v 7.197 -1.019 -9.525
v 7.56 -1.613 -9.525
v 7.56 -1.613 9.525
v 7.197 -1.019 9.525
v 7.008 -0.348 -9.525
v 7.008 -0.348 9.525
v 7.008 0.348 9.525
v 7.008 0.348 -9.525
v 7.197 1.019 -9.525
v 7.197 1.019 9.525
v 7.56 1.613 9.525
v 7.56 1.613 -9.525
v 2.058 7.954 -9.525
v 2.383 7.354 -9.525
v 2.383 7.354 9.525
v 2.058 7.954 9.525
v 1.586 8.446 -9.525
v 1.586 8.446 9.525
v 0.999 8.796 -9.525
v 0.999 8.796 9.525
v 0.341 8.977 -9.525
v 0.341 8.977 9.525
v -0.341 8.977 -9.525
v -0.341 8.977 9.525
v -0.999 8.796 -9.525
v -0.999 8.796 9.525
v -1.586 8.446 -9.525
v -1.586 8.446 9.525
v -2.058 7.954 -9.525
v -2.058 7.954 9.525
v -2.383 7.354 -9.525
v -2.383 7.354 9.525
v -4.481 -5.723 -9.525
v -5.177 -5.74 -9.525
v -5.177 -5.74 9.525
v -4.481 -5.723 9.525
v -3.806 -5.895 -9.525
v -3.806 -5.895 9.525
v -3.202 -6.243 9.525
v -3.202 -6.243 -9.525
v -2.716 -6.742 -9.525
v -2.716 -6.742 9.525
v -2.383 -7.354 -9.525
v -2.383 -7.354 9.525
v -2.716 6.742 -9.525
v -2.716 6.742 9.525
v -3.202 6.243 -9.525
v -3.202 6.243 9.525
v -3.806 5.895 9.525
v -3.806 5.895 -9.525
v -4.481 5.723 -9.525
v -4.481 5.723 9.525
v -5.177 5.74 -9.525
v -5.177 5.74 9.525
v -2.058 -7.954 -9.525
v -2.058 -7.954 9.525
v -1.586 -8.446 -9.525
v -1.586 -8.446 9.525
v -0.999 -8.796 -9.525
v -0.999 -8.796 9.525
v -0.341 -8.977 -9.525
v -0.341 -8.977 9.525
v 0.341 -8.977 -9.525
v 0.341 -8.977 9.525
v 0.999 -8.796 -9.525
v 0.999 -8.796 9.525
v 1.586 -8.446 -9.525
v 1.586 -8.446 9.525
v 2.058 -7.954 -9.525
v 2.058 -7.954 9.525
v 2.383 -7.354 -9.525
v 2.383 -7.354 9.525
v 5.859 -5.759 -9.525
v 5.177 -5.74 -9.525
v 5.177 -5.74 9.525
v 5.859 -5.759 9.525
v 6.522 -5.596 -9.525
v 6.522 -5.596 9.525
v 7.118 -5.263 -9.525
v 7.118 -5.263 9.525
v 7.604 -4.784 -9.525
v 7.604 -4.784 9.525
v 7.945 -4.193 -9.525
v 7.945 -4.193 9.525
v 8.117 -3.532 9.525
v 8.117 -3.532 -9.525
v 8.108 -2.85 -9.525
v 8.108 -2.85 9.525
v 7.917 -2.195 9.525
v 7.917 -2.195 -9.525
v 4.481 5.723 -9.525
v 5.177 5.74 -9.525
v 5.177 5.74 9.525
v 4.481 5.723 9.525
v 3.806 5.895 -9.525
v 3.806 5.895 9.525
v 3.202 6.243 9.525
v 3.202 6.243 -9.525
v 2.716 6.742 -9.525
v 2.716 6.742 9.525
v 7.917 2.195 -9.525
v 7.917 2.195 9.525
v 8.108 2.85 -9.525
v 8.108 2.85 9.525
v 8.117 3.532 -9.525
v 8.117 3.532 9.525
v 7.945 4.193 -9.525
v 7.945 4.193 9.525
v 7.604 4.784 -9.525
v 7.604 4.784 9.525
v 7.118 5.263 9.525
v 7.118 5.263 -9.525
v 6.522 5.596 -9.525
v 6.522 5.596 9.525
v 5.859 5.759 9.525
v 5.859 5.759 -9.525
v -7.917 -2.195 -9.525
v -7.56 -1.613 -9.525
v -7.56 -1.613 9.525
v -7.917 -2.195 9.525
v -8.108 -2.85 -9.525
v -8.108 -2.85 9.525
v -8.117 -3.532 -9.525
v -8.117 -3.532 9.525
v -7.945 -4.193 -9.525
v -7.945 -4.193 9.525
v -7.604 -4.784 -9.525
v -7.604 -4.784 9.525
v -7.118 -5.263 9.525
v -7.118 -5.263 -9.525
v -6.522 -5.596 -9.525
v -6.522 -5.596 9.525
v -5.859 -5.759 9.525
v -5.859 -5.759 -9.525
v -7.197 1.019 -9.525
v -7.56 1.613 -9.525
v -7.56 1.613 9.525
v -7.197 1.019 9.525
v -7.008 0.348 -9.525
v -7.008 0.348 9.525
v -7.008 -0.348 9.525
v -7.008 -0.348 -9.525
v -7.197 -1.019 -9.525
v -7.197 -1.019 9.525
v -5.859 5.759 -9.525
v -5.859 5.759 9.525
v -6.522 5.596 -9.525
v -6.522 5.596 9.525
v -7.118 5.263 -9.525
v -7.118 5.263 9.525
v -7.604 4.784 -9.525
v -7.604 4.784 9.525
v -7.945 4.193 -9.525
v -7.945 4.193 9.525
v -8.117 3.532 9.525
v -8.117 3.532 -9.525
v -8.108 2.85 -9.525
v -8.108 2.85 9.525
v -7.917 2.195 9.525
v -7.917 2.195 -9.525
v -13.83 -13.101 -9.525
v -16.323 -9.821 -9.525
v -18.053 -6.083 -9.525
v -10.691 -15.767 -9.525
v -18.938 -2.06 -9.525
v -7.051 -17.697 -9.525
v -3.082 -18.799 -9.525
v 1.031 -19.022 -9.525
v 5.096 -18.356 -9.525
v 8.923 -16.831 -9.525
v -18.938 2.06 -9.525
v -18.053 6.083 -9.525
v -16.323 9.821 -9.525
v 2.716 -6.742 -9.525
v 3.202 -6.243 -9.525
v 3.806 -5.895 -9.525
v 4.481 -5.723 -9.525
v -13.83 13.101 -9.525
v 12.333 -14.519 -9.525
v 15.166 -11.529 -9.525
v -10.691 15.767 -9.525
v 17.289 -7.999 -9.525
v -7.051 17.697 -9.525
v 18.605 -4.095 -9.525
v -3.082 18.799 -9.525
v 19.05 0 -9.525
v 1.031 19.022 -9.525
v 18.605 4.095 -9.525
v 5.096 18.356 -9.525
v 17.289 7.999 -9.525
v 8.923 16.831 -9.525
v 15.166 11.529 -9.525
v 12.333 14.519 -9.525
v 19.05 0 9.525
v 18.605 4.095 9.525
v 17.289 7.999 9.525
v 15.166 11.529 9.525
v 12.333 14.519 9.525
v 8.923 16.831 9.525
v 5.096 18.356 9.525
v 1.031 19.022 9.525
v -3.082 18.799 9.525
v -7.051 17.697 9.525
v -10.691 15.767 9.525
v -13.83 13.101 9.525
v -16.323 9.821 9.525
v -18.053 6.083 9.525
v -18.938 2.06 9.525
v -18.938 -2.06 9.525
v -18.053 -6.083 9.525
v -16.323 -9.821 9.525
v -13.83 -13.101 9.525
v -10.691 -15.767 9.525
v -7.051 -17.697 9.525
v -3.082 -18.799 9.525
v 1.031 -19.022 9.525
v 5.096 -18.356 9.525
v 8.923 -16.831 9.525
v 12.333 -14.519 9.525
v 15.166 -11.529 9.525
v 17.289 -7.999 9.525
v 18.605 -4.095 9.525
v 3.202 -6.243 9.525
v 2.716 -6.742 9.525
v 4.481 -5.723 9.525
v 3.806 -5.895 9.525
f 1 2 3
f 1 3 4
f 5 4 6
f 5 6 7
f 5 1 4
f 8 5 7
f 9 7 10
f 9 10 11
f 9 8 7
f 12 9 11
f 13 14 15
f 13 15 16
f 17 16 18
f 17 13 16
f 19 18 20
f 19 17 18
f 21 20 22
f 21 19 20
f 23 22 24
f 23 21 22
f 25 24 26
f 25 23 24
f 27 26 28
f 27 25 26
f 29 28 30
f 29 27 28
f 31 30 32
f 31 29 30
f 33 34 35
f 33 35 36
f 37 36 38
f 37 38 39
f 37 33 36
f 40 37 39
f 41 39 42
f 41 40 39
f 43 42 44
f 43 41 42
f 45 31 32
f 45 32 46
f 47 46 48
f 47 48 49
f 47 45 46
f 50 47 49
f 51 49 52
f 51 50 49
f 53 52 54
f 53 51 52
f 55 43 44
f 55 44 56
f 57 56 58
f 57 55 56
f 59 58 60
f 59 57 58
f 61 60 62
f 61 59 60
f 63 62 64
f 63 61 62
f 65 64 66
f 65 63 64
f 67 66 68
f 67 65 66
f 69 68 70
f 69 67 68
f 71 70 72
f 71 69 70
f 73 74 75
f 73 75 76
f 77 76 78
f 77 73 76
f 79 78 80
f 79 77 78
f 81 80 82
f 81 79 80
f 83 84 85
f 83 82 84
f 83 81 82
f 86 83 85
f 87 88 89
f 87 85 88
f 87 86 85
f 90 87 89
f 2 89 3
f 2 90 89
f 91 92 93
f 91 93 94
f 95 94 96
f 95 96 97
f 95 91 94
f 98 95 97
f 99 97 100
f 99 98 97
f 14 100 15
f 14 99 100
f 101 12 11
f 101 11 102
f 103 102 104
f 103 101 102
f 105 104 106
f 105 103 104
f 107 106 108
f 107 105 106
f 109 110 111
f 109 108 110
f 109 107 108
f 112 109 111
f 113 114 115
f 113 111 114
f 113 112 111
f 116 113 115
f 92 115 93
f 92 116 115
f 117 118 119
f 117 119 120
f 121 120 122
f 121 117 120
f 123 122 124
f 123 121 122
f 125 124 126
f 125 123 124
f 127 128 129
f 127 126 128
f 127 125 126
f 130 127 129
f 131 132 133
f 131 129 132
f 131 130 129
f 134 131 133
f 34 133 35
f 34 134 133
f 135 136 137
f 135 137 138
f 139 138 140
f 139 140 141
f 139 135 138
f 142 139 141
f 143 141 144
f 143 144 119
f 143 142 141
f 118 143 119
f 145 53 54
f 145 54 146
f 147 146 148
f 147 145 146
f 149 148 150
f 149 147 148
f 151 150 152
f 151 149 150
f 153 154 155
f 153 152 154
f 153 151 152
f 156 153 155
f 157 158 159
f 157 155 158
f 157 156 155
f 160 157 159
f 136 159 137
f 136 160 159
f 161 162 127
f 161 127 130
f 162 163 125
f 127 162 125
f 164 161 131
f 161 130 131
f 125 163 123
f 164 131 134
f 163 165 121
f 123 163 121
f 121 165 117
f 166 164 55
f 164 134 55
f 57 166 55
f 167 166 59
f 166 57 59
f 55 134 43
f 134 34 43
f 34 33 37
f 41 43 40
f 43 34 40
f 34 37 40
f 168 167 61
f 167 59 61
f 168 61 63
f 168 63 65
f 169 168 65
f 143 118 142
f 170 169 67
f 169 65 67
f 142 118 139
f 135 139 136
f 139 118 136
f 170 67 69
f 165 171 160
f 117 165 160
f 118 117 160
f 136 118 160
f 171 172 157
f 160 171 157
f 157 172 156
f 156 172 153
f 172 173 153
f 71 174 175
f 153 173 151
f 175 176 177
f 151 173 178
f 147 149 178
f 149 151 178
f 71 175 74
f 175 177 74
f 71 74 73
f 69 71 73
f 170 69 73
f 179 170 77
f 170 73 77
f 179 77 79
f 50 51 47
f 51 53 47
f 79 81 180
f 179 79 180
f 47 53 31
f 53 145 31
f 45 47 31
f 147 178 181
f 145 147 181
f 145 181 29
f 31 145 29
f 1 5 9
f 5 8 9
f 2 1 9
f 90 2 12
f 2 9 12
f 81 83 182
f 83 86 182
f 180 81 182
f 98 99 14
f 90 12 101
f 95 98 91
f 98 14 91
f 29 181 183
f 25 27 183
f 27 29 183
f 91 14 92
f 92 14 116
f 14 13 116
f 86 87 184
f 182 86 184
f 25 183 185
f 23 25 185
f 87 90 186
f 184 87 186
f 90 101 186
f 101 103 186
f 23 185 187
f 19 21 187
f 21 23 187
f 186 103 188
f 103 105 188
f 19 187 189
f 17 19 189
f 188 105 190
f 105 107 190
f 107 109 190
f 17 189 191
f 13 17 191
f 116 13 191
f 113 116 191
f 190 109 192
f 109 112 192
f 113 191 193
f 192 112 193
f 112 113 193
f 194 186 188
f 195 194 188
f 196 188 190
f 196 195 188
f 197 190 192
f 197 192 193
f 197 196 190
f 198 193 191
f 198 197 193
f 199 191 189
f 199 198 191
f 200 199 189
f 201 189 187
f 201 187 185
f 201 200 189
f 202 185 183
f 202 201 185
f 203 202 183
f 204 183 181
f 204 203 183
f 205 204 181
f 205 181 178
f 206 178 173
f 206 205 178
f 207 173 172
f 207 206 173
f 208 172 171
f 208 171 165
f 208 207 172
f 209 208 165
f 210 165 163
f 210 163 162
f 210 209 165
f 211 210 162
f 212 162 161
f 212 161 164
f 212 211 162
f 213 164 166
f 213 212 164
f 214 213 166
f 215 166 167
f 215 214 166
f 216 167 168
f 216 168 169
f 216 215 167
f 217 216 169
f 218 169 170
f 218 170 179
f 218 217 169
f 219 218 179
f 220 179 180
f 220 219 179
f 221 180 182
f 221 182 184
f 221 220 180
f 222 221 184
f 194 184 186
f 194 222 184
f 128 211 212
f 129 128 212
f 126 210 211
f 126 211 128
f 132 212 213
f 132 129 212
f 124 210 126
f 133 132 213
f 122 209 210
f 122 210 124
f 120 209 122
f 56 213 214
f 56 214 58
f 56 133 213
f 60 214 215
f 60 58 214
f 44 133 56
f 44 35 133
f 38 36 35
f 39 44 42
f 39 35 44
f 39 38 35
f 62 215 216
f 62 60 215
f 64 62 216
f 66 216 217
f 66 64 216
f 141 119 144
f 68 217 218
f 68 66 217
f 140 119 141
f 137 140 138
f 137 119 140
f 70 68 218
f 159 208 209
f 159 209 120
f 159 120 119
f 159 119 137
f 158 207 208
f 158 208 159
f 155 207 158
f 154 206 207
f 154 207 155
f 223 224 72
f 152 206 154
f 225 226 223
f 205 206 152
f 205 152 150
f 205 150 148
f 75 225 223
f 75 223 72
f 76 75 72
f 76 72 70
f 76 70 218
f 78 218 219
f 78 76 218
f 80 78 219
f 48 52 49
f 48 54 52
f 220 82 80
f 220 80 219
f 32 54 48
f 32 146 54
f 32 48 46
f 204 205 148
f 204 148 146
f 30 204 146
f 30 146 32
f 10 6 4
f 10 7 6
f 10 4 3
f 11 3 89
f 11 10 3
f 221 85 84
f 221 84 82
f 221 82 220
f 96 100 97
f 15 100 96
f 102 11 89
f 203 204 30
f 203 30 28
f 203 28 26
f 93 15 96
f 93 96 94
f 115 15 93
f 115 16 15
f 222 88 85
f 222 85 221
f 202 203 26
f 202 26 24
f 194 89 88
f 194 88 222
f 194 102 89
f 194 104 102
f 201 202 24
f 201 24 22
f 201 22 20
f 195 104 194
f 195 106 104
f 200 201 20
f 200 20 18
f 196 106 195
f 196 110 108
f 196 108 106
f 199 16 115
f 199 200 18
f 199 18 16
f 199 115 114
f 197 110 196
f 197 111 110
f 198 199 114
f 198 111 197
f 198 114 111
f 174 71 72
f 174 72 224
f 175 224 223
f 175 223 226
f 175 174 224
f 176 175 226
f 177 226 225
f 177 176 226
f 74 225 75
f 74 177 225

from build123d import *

# Parameters (mm, degrees)
SKETCH1_R           = 19.05
SKETCH1_R_2         = 5
BOSS_EXTRUDE1_DEPTH = 9.525
CUT_EXTRUDE1_DEPTH  = 20.05


with BuildPart() as part:
    # Sketch1 → Boss-Extrude1 (new body, symmetric)
    with BuildSketch(Plane.XY):
        Circle(SKETCH1_R)
        Circle(SKETCH1_R_2, mode=Mode.SUBTRACT)
    extrude(amount=BOSS_EXTRUDE1_DEPTH, both=True)

    # Sketch2 → Cut-Extrude1 (cut, through all)
    with BuildSketch(Plane(origin=(0, 0, -9.525), x_dir=(-1, 0, 0), z_dir=(0, 0, -1))):
        with BuildLine():
            ThreePointArc((-2.382933771, -7.353538376), (-3.492043555, -6.04839686), (-5.176884156, -5.740450369))
            ThreePointArc((-5.176884156, -5.740450369), (-7.794228634, -4.5), (-7.559817926, -1.613088007))
            ThreePointArc((-7.559817926, -1.613088007), (-6.984087111, 0), (-7.559817926, 1.613088007))
            ThreePointArc((-7.559817926, 1.613088007), (-7.794228634, 4.5), (-5.176884156, 5.740450369))
            ThreePointArc((-5.176884156, 5.740450369), (-3.492043555, 6.04839686), (-2.382933771, 7.353538376))
            ThreePointArc((-2.382933771, 7.353538376), (0, 9), (2.382933771, 7.353538376))
            ThreePointArc((2.382933771, 7.353538376), (3.492043555, 6.04839686), (5.176884156, 5.740450369))
            ThreePointArc((5.176884156, 5.740450369), (7.794228634, 4.5), (7.559817926, 1.613088007))
            ThreePointArc((7.559817926, 1.613088007), (6.984087111, 0), (7.559817926, -1.613088007))
            ThreePointArc((7.559817926, -1.613088007), (7.794228634, -4.5), (5.176884156, -5.740450369))
            ThreePointArc((5.176884156, -5.740450369), (3.492043555, -6.04839686), (2.382933771, -7.353538376))
            ThreePointArc((2.382933771, -7.353538376), (0, -9), (-2.382933771, -7.353538376))
        make_face()
    extrude(amount=-CUT_EXTRUDE1_DEPTH, mode=Mode.SUBTRACT)


solid = part.part
